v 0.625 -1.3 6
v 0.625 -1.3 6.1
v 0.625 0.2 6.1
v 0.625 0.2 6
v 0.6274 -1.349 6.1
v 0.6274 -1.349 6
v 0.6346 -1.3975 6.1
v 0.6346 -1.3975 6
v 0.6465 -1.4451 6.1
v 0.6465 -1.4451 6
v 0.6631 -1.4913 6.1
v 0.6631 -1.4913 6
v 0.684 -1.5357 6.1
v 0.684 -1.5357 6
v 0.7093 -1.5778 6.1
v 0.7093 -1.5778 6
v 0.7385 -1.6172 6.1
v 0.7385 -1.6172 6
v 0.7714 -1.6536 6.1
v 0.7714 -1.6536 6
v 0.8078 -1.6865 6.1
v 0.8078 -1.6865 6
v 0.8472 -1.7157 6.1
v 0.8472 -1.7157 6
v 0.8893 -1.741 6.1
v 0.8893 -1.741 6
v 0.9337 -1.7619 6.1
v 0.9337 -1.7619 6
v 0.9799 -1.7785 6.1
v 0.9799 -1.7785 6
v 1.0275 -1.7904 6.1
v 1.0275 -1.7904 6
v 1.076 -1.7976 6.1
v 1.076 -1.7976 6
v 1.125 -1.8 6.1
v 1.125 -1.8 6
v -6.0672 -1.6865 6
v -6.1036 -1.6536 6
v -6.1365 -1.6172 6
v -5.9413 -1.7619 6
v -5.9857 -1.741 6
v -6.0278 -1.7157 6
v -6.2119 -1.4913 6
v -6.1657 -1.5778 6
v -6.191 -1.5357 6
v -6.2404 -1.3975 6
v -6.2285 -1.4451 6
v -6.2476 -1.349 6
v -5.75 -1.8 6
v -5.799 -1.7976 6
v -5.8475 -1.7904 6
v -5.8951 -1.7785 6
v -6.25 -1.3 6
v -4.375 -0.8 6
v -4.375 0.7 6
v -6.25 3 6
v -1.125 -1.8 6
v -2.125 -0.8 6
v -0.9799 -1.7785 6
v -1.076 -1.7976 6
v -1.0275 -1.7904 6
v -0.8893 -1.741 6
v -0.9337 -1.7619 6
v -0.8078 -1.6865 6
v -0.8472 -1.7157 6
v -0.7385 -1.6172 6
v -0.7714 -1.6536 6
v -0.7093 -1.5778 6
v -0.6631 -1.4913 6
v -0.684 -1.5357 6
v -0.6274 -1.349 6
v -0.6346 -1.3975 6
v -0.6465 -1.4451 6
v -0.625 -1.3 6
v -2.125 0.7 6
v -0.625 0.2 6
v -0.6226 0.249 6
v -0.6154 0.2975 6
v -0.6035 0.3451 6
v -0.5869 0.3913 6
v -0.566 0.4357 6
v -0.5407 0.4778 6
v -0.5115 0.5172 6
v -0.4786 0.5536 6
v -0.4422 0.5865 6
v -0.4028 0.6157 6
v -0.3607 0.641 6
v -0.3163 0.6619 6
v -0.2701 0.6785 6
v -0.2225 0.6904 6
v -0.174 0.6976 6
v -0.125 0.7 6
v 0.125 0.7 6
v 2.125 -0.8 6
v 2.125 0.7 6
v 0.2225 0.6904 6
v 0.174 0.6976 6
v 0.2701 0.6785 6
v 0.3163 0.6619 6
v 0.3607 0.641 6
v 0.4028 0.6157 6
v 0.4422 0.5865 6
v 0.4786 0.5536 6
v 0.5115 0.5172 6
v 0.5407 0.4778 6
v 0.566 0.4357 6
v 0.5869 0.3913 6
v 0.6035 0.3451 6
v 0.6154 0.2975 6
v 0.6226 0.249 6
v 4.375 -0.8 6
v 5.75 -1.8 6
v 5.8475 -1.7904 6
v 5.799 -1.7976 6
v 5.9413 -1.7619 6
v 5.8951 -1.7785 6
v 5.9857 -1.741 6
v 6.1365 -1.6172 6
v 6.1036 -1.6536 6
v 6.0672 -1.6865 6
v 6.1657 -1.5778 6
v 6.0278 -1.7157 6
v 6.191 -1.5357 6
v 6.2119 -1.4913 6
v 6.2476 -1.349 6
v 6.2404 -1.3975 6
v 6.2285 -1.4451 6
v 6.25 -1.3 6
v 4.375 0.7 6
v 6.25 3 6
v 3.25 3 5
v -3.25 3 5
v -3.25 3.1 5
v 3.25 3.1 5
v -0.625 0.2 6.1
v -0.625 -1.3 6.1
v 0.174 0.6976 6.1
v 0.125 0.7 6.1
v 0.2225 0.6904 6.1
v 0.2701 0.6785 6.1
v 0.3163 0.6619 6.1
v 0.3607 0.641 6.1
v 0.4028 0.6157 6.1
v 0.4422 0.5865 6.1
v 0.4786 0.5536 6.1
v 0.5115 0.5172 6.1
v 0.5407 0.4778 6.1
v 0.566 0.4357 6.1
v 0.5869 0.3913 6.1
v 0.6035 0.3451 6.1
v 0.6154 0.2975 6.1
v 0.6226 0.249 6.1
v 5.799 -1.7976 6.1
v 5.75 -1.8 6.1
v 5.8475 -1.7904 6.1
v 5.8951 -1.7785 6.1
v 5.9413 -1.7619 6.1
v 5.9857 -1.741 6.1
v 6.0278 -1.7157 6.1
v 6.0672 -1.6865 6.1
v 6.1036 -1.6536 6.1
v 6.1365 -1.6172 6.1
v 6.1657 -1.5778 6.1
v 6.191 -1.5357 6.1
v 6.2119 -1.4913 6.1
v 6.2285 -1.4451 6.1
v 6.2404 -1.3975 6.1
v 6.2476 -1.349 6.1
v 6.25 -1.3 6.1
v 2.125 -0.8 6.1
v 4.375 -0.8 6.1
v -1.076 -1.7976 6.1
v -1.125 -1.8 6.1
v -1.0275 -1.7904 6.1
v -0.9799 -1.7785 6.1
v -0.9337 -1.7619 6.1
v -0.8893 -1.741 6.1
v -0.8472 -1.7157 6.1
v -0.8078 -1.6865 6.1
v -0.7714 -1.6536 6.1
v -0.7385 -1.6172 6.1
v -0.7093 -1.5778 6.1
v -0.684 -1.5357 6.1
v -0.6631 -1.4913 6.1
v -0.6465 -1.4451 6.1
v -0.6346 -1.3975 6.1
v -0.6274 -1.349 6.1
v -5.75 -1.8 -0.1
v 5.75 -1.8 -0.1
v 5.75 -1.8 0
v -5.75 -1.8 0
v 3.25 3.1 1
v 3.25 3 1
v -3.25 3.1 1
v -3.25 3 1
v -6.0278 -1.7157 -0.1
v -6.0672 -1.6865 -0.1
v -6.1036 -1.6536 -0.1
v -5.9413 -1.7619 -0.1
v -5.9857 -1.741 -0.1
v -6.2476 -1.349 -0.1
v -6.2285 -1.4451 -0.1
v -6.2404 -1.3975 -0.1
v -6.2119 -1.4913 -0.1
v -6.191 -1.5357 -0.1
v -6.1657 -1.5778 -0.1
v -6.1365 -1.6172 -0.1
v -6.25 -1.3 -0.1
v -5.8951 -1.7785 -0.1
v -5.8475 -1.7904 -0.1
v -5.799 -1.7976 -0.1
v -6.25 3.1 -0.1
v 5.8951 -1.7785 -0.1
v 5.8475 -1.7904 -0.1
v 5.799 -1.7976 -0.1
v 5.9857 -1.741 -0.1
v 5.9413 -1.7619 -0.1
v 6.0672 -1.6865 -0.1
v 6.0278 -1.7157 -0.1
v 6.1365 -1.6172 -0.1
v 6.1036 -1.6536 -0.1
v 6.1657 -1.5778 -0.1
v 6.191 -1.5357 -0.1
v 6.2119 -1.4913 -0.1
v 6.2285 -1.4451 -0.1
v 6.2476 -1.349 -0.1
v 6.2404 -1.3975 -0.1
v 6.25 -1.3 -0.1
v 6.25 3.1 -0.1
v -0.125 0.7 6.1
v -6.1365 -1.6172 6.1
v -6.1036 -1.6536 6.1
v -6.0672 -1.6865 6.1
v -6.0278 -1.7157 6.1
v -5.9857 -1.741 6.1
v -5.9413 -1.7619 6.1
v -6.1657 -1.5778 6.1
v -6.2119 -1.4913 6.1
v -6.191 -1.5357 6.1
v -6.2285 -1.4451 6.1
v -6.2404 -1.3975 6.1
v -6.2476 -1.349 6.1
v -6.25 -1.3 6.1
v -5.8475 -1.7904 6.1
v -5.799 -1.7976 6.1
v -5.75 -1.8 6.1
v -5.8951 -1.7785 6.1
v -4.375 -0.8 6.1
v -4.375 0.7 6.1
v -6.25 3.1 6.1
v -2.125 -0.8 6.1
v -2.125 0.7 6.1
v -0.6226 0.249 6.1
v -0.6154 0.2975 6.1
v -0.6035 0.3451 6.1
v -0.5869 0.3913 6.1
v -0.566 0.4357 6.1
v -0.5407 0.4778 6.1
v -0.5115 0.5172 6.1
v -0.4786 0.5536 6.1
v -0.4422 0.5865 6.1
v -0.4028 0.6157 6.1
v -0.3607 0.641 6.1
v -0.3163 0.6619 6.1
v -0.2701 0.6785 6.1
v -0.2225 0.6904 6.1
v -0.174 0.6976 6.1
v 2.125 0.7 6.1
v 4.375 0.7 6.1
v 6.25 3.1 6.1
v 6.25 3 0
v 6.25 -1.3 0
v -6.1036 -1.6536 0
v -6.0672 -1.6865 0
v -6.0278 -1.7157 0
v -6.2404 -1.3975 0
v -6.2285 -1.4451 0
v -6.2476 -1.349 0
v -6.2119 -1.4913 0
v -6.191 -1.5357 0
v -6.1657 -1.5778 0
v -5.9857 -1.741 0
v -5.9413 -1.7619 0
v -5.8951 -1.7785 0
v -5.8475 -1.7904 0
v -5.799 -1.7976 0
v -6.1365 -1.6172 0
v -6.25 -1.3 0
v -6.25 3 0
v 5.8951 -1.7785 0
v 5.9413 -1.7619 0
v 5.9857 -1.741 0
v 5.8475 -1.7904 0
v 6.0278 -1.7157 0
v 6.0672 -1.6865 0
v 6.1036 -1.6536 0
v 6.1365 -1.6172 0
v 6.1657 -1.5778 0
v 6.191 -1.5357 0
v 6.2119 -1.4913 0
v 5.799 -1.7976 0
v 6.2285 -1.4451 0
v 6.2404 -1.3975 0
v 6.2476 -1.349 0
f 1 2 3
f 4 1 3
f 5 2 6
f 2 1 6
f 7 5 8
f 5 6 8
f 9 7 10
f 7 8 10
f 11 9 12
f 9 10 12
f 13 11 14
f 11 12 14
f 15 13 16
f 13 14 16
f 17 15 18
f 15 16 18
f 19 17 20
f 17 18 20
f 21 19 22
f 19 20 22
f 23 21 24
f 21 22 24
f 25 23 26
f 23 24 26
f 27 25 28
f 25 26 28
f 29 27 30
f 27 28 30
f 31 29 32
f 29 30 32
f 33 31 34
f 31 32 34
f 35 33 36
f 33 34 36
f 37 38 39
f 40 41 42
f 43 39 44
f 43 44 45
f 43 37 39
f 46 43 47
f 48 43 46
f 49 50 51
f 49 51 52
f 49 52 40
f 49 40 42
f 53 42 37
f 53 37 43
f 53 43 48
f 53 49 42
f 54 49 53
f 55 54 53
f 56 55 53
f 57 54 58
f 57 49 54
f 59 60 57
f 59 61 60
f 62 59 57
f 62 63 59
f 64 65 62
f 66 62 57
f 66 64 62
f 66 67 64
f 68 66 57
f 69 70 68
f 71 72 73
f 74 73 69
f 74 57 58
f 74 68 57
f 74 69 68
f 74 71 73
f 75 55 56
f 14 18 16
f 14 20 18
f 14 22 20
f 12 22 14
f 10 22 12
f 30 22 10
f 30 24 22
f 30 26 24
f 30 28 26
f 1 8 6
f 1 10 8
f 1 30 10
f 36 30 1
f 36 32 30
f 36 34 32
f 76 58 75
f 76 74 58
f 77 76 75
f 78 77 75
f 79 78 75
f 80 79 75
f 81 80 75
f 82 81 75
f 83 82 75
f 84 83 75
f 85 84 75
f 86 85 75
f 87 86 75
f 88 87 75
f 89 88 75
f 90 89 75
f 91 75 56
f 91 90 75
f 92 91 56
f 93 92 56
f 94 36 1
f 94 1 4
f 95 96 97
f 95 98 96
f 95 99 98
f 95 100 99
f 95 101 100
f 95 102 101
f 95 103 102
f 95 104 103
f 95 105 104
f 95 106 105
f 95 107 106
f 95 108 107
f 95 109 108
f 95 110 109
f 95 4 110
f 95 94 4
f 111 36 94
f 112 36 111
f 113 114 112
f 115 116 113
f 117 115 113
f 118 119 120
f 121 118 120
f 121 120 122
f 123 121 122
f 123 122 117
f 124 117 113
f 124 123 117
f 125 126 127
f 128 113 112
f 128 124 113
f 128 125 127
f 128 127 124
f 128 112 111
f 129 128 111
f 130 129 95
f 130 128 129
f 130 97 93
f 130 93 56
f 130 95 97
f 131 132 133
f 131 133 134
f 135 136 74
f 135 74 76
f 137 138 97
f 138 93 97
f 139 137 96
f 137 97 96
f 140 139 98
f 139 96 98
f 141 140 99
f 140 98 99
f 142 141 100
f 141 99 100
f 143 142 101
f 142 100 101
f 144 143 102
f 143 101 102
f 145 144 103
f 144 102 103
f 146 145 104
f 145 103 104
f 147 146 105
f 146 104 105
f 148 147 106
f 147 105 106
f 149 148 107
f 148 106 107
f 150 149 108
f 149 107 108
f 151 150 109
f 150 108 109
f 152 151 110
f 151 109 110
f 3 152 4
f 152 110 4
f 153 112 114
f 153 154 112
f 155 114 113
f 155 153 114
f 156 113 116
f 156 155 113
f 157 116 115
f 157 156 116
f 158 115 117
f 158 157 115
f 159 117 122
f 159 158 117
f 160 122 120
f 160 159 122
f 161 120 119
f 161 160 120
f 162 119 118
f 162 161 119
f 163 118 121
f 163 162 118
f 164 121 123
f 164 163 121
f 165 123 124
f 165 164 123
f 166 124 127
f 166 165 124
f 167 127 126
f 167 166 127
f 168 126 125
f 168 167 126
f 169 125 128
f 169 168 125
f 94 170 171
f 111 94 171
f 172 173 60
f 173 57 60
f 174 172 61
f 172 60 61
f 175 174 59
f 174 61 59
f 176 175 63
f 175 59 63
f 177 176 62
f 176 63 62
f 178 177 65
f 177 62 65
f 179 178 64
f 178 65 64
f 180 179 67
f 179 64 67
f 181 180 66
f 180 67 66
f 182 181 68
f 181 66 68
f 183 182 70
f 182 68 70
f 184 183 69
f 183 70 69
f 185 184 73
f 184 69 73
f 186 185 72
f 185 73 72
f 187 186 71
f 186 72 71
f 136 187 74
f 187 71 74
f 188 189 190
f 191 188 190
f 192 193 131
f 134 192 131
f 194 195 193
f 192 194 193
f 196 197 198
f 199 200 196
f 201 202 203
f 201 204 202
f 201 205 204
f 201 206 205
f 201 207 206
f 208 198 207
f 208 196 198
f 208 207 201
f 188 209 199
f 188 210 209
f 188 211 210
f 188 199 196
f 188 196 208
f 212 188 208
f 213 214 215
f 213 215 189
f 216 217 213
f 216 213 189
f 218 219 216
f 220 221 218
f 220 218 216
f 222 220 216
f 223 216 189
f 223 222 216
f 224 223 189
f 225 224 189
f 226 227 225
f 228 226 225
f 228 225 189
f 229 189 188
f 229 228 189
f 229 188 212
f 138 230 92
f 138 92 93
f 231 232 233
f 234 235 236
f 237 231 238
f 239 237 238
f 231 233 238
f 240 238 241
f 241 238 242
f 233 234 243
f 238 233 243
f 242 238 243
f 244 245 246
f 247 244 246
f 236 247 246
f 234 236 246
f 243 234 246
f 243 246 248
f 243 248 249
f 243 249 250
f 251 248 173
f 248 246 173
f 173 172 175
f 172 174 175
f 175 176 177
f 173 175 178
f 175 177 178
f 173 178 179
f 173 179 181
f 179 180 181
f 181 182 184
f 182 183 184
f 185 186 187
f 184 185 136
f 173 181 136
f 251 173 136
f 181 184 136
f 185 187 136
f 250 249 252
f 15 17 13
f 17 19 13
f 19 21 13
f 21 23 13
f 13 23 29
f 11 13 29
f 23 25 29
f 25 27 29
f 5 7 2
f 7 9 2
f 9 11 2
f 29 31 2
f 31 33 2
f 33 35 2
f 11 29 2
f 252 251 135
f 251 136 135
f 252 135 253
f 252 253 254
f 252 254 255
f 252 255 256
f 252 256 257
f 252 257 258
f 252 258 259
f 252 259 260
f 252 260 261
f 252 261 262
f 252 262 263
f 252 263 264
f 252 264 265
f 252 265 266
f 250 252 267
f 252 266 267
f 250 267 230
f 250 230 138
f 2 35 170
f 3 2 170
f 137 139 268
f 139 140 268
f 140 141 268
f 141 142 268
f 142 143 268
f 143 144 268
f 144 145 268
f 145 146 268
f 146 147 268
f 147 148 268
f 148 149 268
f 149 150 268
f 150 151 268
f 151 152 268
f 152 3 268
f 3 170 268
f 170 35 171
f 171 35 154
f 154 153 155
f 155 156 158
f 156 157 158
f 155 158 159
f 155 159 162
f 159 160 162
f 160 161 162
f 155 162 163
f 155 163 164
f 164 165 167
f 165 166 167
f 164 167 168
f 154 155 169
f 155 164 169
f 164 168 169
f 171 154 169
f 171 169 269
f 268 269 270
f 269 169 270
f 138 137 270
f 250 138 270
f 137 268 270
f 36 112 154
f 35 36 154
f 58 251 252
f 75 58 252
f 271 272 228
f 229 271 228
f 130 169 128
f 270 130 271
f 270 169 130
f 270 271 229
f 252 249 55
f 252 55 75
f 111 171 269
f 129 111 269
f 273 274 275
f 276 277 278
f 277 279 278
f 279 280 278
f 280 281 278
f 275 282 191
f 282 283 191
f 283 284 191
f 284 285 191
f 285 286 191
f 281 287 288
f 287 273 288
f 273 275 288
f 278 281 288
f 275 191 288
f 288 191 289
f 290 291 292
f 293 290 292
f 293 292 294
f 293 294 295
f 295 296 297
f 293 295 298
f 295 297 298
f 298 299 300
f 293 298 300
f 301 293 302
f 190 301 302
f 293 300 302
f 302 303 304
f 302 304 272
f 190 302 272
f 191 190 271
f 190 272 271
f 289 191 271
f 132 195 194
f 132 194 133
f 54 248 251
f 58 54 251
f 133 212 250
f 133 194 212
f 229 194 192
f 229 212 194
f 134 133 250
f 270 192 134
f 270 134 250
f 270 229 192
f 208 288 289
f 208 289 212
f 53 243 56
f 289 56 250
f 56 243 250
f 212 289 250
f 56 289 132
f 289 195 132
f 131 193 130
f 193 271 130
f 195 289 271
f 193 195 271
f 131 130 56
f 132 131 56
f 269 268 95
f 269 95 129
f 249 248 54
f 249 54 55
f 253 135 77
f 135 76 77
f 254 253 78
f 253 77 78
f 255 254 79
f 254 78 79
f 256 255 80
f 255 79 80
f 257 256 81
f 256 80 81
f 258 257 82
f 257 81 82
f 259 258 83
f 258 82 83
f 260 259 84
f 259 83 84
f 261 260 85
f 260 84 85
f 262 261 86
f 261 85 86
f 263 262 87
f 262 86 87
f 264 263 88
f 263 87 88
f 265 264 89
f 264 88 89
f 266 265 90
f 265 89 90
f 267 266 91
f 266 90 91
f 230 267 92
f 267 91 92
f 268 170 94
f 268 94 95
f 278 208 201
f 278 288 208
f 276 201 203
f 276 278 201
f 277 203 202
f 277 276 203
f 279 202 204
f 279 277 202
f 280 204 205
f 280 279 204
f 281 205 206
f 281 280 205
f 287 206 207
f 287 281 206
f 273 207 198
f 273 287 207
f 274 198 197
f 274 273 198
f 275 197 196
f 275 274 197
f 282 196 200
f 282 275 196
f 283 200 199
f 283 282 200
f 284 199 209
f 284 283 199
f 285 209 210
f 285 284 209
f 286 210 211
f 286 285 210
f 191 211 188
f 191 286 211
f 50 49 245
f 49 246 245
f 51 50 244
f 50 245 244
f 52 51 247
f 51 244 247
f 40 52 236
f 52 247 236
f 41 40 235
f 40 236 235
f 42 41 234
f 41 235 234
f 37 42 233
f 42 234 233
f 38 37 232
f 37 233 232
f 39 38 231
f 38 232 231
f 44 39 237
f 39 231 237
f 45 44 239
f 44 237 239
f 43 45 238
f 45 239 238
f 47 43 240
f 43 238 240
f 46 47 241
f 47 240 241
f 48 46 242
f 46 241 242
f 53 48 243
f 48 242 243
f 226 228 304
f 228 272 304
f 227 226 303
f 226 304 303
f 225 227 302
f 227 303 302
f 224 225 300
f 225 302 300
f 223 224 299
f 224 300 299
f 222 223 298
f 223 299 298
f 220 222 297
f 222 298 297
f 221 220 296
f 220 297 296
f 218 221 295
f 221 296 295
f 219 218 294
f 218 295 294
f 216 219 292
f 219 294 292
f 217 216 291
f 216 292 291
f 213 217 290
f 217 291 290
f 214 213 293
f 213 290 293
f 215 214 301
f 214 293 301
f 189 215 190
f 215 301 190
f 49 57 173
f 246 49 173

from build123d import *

# Parameters (mm, degrees)
SKETCH002_W     = 4.9
SKETCH002_H     = 0.1
SKETCH002_W_2   = 0.1
SKETCH002_H_2   = 6.1
SKETCH002_W_3   = 4.8
EXTRUDE_DEPTH   = 6.25
SKETCH003_W     = 1.25
SKETCH003_H     = 2.5
SKETCH003_W_2   = 2.25
SKETCH003_H_2   = 1.5
POCKET_DEPTH    = 5
FILLET_R        = 0.5
SKETCH005_W     = 6.5
SKETCH005_H     = 4
POCKET001_DEPTH = 5


with BuildPart() as part:
    # Sketch002 → Extrude (new body, symmetric)
    with BuildSketch(Plane.YZ):
        with Locations((0.65, 6.05)):
            Rectangle(SKETCH002_W, SKETCH002_H)
        with Locations((3.05, 2.95)):
            Rectangle(SKETCH002_W_2, SKETCH002_H_2)
        with Locations((0.6, -0.05)):
            Rectangle(SKETCH002_W_3, SKETCH002_H)
    extrude(amount=EXTRUDE_DEPTH, both=True)

    # Sketch003 (on Face9 of Extrude) → Pocket (cut)
    with BuildSketch(Plane.XY.offset(6.1)):
        with Locations((0, -0.55)):
            Rectangle(SKETCH003_W, SKETCH003_H)
        with Locations((3.25, -0.05)):
            Rectangle(SKETCH003_W_2, SKETCH003_H_2)
        with Locations((-3.25, -0.05)):
            Rectangle(SKETCH003_W_2, SKETCH003_H_2)
    extrude(amount=-POCKET_DEPTH, mode=Mode.SUBTRACT)

    # Fillet
    fillet_edges = [part.edges().sort_by_distance(p)[0] for p in [
        (0.625, -1.8, 6.05),
        (0.625, 0.7, 6.05),
        (-0.625, -1.8, 6.05),
        (-0.625, 0.7, 6.05),
        (6.25, -1.8, 6.05),
        (-6.25, -1.8, 6.05),
        (-6.25, -1.8, -0.05),
        (6.25, -1.8, -0.05),
    ]]
    fillet(fillet_edges, radius=FILLET_R)

    # Sketch005 (on Face4 of Fillet) → Pocket001 (cut)
    with BuildSketch(Plane.XZ.offset(-3)):
        with Locations((0, 3)):
            Rectangle(SKETCH005_W, SKETCH005_H)
    extrude(amount=-POCKET001_DEPTH, mode=Mode.SUBTRACT)


solid = part.part
